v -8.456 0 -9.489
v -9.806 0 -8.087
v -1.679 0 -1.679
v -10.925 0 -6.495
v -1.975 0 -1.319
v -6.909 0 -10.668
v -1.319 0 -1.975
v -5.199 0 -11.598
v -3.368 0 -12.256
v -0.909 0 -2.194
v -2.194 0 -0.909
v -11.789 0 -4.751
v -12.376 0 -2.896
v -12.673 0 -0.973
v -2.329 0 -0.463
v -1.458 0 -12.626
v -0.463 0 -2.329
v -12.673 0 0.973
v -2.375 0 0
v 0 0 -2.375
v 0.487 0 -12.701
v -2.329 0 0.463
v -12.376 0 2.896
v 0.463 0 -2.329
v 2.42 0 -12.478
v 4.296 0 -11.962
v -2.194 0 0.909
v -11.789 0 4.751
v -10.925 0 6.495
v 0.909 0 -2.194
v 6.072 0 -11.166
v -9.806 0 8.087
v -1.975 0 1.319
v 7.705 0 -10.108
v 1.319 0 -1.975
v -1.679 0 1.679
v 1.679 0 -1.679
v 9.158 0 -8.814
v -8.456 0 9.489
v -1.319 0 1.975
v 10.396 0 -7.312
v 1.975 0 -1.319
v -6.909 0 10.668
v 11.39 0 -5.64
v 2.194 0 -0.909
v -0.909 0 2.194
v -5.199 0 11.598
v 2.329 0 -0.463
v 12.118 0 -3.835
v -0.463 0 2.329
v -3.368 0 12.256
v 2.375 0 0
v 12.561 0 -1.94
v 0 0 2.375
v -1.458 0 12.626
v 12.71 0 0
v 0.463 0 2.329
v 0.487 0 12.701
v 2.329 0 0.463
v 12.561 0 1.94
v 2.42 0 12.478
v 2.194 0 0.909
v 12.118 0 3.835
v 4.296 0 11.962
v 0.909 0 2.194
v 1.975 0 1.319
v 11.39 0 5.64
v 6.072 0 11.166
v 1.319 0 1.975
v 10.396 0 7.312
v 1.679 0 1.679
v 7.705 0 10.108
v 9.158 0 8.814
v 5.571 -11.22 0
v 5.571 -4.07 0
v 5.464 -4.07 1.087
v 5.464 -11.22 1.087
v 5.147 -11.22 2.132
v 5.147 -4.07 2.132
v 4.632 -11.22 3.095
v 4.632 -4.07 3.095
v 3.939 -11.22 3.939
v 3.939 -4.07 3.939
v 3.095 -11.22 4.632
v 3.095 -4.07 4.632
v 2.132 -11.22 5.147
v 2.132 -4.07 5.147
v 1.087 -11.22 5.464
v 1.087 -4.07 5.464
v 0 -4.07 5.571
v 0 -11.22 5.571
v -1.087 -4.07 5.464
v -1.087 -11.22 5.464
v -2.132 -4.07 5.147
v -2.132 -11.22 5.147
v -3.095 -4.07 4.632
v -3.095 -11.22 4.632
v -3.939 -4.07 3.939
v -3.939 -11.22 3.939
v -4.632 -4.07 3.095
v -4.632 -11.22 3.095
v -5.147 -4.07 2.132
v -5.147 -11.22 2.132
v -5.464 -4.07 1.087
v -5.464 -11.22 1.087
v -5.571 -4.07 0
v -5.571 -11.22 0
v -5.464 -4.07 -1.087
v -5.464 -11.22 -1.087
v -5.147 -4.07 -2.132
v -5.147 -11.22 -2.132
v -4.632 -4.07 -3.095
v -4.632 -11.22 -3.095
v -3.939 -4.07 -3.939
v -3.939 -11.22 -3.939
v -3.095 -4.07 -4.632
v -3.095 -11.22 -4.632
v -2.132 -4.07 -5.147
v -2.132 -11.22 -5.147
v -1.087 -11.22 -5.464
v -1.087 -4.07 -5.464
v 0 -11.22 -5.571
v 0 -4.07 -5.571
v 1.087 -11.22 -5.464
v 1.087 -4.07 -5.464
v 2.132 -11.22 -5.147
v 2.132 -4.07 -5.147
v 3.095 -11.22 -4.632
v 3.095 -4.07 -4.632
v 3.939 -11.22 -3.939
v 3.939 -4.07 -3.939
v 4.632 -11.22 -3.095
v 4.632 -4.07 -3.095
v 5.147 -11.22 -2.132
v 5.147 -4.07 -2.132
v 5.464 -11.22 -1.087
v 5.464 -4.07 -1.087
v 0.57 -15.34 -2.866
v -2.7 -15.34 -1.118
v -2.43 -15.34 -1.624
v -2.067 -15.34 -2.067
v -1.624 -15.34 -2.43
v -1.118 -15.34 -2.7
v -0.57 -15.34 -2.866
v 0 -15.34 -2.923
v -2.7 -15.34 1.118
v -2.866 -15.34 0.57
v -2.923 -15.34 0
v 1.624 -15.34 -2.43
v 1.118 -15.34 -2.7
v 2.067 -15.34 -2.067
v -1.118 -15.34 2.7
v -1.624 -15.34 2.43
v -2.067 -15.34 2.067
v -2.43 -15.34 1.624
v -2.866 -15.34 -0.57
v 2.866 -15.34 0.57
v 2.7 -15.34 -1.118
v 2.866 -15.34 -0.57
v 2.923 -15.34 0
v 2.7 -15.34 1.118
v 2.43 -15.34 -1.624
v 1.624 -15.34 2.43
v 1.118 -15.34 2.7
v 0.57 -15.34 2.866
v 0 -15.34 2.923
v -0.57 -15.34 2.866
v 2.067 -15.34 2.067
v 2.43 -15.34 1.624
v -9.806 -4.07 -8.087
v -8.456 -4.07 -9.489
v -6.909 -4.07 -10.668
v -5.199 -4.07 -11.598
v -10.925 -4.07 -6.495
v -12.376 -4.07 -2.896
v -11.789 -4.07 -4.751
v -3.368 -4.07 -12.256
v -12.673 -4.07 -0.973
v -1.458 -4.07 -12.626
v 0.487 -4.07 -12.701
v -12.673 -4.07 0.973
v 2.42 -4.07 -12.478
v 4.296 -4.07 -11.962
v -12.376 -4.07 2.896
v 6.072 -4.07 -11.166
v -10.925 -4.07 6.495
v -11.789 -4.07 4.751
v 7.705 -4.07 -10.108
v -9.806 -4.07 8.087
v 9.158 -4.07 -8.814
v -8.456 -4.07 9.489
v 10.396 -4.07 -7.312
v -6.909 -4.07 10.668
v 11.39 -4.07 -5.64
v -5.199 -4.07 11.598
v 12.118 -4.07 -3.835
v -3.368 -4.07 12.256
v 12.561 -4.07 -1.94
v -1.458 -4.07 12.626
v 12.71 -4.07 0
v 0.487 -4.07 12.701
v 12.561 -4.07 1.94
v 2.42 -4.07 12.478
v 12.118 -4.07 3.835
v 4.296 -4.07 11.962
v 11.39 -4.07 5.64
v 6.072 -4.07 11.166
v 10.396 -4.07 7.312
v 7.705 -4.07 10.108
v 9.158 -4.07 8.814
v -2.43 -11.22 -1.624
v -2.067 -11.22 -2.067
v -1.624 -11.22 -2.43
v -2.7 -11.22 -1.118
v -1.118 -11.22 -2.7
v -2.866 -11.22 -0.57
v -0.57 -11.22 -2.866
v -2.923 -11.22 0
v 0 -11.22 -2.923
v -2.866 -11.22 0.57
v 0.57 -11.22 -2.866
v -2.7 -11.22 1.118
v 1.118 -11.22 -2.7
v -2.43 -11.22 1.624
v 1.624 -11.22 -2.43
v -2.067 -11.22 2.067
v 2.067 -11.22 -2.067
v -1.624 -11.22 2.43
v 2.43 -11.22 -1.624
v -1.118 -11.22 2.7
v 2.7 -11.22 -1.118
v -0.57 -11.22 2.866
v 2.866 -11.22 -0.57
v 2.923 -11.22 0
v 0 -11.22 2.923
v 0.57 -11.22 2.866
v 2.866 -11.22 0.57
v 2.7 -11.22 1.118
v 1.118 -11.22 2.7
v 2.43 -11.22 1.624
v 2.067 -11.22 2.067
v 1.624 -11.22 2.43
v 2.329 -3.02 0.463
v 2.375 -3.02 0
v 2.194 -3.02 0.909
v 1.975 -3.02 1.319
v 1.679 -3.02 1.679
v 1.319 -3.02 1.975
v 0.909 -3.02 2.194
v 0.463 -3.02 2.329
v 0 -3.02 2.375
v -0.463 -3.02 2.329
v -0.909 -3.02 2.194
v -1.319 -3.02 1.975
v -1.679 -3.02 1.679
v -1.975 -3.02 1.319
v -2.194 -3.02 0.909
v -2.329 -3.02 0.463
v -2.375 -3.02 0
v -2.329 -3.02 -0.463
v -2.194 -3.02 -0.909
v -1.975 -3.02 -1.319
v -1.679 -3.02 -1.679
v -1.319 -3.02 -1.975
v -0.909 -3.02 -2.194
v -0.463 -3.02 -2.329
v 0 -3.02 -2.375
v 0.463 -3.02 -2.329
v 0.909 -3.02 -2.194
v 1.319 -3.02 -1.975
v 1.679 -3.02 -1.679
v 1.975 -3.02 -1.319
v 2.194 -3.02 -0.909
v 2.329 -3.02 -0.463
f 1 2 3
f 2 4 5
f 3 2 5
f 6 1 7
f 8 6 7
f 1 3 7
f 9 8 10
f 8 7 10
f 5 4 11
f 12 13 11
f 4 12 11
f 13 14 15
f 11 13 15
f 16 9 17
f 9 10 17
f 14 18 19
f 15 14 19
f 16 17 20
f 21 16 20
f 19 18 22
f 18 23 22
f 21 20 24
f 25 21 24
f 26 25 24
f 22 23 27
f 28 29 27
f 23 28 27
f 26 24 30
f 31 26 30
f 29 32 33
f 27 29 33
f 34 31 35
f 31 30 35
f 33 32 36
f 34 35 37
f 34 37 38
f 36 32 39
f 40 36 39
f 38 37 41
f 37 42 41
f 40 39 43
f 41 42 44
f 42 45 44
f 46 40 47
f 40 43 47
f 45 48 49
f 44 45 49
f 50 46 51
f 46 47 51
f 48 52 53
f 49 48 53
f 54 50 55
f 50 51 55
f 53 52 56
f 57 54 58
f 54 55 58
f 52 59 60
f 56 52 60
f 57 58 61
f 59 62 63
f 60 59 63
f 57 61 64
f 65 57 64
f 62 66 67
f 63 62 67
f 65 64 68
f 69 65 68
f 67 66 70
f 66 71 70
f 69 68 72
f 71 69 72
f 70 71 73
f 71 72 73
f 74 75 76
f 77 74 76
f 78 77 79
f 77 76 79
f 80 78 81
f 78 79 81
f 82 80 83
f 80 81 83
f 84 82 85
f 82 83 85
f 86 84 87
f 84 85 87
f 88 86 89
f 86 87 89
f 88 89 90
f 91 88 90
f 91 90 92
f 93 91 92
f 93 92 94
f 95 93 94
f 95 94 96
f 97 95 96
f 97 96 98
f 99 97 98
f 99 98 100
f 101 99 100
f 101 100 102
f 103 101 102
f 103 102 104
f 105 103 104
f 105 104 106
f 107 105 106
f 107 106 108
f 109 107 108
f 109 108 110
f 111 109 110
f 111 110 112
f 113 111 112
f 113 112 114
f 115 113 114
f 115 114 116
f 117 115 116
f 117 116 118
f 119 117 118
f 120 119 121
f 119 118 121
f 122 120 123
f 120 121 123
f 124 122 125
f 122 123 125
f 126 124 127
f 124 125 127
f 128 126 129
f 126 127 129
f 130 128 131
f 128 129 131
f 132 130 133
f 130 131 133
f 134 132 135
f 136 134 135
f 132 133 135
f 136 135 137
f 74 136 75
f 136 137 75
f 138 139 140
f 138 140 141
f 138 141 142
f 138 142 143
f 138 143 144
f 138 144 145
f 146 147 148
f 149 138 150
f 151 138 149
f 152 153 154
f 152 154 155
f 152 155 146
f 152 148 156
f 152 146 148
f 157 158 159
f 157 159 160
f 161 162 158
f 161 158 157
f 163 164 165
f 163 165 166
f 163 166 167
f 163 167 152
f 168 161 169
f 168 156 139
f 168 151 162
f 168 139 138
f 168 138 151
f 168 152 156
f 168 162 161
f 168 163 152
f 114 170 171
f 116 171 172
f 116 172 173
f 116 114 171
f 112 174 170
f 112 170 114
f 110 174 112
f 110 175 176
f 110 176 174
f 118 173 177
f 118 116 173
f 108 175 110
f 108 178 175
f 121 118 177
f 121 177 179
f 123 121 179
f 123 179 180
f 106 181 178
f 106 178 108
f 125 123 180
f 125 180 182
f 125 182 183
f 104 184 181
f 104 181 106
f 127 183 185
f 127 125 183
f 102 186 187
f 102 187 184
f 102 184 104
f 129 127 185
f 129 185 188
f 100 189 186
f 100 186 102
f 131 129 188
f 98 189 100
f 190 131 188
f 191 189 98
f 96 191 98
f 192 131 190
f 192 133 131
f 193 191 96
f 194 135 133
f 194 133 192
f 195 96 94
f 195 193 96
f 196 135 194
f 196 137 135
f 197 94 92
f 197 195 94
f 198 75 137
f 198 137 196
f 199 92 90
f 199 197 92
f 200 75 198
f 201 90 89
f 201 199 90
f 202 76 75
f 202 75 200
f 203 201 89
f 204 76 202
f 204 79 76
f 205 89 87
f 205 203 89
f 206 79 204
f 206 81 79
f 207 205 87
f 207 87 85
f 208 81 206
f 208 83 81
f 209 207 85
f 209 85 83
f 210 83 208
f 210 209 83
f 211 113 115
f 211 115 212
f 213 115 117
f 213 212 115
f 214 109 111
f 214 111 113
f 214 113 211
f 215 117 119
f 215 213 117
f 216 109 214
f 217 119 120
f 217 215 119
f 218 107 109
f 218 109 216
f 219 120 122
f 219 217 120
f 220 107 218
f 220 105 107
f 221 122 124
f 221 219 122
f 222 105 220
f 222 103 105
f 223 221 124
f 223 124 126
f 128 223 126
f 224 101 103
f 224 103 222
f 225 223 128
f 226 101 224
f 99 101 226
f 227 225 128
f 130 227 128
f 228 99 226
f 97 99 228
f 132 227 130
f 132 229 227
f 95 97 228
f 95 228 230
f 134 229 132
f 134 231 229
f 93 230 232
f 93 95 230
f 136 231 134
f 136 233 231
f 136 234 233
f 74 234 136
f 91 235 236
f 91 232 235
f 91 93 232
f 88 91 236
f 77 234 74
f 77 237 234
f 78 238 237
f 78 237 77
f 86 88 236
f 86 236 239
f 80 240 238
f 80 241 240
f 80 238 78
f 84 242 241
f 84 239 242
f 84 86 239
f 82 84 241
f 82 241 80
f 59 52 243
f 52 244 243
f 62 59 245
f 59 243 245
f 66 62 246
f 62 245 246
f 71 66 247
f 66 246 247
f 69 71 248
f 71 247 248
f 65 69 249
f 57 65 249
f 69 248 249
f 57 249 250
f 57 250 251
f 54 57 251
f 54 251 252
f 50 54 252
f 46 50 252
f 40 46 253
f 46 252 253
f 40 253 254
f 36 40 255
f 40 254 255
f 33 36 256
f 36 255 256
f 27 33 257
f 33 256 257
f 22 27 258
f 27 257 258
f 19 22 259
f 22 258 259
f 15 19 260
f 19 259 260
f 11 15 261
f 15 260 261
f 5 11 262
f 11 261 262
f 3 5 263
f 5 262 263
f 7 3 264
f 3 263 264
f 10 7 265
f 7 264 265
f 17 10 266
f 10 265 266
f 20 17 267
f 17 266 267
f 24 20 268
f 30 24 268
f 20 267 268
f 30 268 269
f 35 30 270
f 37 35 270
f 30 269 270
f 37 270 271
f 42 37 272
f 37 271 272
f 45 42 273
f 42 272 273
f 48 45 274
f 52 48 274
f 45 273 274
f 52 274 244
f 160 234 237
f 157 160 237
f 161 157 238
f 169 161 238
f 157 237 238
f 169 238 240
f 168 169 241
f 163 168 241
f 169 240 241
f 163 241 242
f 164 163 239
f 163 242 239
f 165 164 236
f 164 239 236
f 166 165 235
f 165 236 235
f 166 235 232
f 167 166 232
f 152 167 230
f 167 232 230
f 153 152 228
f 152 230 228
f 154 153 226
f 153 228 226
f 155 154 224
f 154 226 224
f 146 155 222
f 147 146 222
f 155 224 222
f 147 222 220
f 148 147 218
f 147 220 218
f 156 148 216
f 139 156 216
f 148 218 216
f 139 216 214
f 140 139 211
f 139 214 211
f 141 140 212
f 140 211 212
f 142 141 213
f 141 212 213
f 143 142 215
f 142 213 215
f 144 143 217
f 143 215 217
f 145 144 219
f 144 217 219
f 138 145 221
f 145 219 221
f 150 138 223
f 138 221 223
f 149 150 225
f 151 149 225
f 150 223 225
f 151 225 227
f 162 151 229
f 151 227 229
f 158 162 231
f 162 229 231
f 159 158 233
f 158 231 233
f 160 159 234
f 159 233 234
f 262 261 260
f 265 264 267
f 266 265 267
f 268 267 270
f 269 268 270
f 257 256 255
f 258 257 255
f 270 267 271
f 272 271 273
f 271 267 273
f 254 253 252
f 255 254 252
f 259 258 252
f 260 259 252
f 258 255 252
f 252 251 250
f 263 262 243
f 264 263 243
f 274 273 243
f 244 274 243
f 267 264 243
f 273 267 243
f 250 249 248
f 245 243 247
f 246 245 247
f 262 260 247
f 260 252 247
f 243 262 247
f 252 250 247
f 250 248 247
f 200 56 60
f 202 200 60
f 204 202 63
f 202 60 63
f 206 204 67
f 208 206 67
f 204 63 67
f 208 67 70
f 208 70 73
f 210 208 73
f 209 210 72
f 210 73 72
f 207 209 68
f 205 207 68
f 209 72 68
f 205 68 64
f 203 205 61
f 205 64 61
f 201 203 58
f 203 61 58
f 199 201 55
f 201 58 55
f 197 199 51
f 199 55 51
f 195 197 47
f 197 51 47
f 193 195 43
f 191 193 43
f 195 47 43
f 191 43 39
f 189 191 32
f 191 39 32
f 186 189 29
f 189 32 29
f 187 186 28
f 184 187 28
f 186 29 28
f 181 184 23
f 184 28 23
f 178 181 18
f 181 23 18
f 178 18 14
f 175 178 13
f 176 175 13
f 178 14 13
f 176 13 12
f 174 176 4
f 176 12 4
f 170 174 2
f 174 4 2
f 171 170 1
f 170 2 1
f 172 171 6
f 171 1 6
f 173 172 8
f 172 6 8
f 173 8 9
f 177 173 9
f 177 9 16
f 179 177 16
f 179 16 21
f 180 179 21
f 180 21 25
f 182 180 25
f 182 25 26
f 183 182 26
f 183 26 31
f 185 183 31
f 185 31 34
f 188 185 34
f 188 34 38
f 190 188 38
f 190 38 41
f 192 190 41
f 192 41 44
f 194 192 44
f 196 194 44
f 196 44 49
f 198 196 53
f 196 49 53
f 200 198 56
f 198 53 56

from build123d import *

# Parameters (mm, degrees)
F0_R     = 12.71
F1_DEPTH = 4.07
F2_R     = 5.5707205992
F3_DEPTH = 11.22
F4_R     = 2.9226210924
F5_DEPTH = 4.12
F6_R     = 2.375
F7_DEPTH = 3.02


with BuildPart() as f1:
    # F0 (on Front) → F1 (new body)
    with BuildSketch(Plane.XZ):
        Circle(F0_R)
    extrude(amount=F1_DEPTH)

    # F2 (on Front) → F3 (join)
    with BuildSketch(Plane.XZ):
        Circle(F2_R)
    extrude(amount=F3_DEPTH)

    # F4 (on face) → F5 (join)
    with BuildSketch(Plane.XZ.offset(11.22)):
        Circle(F4_R)
    extrude(amount=F5_DEPTH)

    # F6 (on face) → F7 (cut, symmetric)
    with BuildSketch(Plane.XZ):
        Circle(F6_R)
    extrude(amount=F7_DEPTH, both=True, mode=Mode.SUBTRACT)


solid = f1.part
